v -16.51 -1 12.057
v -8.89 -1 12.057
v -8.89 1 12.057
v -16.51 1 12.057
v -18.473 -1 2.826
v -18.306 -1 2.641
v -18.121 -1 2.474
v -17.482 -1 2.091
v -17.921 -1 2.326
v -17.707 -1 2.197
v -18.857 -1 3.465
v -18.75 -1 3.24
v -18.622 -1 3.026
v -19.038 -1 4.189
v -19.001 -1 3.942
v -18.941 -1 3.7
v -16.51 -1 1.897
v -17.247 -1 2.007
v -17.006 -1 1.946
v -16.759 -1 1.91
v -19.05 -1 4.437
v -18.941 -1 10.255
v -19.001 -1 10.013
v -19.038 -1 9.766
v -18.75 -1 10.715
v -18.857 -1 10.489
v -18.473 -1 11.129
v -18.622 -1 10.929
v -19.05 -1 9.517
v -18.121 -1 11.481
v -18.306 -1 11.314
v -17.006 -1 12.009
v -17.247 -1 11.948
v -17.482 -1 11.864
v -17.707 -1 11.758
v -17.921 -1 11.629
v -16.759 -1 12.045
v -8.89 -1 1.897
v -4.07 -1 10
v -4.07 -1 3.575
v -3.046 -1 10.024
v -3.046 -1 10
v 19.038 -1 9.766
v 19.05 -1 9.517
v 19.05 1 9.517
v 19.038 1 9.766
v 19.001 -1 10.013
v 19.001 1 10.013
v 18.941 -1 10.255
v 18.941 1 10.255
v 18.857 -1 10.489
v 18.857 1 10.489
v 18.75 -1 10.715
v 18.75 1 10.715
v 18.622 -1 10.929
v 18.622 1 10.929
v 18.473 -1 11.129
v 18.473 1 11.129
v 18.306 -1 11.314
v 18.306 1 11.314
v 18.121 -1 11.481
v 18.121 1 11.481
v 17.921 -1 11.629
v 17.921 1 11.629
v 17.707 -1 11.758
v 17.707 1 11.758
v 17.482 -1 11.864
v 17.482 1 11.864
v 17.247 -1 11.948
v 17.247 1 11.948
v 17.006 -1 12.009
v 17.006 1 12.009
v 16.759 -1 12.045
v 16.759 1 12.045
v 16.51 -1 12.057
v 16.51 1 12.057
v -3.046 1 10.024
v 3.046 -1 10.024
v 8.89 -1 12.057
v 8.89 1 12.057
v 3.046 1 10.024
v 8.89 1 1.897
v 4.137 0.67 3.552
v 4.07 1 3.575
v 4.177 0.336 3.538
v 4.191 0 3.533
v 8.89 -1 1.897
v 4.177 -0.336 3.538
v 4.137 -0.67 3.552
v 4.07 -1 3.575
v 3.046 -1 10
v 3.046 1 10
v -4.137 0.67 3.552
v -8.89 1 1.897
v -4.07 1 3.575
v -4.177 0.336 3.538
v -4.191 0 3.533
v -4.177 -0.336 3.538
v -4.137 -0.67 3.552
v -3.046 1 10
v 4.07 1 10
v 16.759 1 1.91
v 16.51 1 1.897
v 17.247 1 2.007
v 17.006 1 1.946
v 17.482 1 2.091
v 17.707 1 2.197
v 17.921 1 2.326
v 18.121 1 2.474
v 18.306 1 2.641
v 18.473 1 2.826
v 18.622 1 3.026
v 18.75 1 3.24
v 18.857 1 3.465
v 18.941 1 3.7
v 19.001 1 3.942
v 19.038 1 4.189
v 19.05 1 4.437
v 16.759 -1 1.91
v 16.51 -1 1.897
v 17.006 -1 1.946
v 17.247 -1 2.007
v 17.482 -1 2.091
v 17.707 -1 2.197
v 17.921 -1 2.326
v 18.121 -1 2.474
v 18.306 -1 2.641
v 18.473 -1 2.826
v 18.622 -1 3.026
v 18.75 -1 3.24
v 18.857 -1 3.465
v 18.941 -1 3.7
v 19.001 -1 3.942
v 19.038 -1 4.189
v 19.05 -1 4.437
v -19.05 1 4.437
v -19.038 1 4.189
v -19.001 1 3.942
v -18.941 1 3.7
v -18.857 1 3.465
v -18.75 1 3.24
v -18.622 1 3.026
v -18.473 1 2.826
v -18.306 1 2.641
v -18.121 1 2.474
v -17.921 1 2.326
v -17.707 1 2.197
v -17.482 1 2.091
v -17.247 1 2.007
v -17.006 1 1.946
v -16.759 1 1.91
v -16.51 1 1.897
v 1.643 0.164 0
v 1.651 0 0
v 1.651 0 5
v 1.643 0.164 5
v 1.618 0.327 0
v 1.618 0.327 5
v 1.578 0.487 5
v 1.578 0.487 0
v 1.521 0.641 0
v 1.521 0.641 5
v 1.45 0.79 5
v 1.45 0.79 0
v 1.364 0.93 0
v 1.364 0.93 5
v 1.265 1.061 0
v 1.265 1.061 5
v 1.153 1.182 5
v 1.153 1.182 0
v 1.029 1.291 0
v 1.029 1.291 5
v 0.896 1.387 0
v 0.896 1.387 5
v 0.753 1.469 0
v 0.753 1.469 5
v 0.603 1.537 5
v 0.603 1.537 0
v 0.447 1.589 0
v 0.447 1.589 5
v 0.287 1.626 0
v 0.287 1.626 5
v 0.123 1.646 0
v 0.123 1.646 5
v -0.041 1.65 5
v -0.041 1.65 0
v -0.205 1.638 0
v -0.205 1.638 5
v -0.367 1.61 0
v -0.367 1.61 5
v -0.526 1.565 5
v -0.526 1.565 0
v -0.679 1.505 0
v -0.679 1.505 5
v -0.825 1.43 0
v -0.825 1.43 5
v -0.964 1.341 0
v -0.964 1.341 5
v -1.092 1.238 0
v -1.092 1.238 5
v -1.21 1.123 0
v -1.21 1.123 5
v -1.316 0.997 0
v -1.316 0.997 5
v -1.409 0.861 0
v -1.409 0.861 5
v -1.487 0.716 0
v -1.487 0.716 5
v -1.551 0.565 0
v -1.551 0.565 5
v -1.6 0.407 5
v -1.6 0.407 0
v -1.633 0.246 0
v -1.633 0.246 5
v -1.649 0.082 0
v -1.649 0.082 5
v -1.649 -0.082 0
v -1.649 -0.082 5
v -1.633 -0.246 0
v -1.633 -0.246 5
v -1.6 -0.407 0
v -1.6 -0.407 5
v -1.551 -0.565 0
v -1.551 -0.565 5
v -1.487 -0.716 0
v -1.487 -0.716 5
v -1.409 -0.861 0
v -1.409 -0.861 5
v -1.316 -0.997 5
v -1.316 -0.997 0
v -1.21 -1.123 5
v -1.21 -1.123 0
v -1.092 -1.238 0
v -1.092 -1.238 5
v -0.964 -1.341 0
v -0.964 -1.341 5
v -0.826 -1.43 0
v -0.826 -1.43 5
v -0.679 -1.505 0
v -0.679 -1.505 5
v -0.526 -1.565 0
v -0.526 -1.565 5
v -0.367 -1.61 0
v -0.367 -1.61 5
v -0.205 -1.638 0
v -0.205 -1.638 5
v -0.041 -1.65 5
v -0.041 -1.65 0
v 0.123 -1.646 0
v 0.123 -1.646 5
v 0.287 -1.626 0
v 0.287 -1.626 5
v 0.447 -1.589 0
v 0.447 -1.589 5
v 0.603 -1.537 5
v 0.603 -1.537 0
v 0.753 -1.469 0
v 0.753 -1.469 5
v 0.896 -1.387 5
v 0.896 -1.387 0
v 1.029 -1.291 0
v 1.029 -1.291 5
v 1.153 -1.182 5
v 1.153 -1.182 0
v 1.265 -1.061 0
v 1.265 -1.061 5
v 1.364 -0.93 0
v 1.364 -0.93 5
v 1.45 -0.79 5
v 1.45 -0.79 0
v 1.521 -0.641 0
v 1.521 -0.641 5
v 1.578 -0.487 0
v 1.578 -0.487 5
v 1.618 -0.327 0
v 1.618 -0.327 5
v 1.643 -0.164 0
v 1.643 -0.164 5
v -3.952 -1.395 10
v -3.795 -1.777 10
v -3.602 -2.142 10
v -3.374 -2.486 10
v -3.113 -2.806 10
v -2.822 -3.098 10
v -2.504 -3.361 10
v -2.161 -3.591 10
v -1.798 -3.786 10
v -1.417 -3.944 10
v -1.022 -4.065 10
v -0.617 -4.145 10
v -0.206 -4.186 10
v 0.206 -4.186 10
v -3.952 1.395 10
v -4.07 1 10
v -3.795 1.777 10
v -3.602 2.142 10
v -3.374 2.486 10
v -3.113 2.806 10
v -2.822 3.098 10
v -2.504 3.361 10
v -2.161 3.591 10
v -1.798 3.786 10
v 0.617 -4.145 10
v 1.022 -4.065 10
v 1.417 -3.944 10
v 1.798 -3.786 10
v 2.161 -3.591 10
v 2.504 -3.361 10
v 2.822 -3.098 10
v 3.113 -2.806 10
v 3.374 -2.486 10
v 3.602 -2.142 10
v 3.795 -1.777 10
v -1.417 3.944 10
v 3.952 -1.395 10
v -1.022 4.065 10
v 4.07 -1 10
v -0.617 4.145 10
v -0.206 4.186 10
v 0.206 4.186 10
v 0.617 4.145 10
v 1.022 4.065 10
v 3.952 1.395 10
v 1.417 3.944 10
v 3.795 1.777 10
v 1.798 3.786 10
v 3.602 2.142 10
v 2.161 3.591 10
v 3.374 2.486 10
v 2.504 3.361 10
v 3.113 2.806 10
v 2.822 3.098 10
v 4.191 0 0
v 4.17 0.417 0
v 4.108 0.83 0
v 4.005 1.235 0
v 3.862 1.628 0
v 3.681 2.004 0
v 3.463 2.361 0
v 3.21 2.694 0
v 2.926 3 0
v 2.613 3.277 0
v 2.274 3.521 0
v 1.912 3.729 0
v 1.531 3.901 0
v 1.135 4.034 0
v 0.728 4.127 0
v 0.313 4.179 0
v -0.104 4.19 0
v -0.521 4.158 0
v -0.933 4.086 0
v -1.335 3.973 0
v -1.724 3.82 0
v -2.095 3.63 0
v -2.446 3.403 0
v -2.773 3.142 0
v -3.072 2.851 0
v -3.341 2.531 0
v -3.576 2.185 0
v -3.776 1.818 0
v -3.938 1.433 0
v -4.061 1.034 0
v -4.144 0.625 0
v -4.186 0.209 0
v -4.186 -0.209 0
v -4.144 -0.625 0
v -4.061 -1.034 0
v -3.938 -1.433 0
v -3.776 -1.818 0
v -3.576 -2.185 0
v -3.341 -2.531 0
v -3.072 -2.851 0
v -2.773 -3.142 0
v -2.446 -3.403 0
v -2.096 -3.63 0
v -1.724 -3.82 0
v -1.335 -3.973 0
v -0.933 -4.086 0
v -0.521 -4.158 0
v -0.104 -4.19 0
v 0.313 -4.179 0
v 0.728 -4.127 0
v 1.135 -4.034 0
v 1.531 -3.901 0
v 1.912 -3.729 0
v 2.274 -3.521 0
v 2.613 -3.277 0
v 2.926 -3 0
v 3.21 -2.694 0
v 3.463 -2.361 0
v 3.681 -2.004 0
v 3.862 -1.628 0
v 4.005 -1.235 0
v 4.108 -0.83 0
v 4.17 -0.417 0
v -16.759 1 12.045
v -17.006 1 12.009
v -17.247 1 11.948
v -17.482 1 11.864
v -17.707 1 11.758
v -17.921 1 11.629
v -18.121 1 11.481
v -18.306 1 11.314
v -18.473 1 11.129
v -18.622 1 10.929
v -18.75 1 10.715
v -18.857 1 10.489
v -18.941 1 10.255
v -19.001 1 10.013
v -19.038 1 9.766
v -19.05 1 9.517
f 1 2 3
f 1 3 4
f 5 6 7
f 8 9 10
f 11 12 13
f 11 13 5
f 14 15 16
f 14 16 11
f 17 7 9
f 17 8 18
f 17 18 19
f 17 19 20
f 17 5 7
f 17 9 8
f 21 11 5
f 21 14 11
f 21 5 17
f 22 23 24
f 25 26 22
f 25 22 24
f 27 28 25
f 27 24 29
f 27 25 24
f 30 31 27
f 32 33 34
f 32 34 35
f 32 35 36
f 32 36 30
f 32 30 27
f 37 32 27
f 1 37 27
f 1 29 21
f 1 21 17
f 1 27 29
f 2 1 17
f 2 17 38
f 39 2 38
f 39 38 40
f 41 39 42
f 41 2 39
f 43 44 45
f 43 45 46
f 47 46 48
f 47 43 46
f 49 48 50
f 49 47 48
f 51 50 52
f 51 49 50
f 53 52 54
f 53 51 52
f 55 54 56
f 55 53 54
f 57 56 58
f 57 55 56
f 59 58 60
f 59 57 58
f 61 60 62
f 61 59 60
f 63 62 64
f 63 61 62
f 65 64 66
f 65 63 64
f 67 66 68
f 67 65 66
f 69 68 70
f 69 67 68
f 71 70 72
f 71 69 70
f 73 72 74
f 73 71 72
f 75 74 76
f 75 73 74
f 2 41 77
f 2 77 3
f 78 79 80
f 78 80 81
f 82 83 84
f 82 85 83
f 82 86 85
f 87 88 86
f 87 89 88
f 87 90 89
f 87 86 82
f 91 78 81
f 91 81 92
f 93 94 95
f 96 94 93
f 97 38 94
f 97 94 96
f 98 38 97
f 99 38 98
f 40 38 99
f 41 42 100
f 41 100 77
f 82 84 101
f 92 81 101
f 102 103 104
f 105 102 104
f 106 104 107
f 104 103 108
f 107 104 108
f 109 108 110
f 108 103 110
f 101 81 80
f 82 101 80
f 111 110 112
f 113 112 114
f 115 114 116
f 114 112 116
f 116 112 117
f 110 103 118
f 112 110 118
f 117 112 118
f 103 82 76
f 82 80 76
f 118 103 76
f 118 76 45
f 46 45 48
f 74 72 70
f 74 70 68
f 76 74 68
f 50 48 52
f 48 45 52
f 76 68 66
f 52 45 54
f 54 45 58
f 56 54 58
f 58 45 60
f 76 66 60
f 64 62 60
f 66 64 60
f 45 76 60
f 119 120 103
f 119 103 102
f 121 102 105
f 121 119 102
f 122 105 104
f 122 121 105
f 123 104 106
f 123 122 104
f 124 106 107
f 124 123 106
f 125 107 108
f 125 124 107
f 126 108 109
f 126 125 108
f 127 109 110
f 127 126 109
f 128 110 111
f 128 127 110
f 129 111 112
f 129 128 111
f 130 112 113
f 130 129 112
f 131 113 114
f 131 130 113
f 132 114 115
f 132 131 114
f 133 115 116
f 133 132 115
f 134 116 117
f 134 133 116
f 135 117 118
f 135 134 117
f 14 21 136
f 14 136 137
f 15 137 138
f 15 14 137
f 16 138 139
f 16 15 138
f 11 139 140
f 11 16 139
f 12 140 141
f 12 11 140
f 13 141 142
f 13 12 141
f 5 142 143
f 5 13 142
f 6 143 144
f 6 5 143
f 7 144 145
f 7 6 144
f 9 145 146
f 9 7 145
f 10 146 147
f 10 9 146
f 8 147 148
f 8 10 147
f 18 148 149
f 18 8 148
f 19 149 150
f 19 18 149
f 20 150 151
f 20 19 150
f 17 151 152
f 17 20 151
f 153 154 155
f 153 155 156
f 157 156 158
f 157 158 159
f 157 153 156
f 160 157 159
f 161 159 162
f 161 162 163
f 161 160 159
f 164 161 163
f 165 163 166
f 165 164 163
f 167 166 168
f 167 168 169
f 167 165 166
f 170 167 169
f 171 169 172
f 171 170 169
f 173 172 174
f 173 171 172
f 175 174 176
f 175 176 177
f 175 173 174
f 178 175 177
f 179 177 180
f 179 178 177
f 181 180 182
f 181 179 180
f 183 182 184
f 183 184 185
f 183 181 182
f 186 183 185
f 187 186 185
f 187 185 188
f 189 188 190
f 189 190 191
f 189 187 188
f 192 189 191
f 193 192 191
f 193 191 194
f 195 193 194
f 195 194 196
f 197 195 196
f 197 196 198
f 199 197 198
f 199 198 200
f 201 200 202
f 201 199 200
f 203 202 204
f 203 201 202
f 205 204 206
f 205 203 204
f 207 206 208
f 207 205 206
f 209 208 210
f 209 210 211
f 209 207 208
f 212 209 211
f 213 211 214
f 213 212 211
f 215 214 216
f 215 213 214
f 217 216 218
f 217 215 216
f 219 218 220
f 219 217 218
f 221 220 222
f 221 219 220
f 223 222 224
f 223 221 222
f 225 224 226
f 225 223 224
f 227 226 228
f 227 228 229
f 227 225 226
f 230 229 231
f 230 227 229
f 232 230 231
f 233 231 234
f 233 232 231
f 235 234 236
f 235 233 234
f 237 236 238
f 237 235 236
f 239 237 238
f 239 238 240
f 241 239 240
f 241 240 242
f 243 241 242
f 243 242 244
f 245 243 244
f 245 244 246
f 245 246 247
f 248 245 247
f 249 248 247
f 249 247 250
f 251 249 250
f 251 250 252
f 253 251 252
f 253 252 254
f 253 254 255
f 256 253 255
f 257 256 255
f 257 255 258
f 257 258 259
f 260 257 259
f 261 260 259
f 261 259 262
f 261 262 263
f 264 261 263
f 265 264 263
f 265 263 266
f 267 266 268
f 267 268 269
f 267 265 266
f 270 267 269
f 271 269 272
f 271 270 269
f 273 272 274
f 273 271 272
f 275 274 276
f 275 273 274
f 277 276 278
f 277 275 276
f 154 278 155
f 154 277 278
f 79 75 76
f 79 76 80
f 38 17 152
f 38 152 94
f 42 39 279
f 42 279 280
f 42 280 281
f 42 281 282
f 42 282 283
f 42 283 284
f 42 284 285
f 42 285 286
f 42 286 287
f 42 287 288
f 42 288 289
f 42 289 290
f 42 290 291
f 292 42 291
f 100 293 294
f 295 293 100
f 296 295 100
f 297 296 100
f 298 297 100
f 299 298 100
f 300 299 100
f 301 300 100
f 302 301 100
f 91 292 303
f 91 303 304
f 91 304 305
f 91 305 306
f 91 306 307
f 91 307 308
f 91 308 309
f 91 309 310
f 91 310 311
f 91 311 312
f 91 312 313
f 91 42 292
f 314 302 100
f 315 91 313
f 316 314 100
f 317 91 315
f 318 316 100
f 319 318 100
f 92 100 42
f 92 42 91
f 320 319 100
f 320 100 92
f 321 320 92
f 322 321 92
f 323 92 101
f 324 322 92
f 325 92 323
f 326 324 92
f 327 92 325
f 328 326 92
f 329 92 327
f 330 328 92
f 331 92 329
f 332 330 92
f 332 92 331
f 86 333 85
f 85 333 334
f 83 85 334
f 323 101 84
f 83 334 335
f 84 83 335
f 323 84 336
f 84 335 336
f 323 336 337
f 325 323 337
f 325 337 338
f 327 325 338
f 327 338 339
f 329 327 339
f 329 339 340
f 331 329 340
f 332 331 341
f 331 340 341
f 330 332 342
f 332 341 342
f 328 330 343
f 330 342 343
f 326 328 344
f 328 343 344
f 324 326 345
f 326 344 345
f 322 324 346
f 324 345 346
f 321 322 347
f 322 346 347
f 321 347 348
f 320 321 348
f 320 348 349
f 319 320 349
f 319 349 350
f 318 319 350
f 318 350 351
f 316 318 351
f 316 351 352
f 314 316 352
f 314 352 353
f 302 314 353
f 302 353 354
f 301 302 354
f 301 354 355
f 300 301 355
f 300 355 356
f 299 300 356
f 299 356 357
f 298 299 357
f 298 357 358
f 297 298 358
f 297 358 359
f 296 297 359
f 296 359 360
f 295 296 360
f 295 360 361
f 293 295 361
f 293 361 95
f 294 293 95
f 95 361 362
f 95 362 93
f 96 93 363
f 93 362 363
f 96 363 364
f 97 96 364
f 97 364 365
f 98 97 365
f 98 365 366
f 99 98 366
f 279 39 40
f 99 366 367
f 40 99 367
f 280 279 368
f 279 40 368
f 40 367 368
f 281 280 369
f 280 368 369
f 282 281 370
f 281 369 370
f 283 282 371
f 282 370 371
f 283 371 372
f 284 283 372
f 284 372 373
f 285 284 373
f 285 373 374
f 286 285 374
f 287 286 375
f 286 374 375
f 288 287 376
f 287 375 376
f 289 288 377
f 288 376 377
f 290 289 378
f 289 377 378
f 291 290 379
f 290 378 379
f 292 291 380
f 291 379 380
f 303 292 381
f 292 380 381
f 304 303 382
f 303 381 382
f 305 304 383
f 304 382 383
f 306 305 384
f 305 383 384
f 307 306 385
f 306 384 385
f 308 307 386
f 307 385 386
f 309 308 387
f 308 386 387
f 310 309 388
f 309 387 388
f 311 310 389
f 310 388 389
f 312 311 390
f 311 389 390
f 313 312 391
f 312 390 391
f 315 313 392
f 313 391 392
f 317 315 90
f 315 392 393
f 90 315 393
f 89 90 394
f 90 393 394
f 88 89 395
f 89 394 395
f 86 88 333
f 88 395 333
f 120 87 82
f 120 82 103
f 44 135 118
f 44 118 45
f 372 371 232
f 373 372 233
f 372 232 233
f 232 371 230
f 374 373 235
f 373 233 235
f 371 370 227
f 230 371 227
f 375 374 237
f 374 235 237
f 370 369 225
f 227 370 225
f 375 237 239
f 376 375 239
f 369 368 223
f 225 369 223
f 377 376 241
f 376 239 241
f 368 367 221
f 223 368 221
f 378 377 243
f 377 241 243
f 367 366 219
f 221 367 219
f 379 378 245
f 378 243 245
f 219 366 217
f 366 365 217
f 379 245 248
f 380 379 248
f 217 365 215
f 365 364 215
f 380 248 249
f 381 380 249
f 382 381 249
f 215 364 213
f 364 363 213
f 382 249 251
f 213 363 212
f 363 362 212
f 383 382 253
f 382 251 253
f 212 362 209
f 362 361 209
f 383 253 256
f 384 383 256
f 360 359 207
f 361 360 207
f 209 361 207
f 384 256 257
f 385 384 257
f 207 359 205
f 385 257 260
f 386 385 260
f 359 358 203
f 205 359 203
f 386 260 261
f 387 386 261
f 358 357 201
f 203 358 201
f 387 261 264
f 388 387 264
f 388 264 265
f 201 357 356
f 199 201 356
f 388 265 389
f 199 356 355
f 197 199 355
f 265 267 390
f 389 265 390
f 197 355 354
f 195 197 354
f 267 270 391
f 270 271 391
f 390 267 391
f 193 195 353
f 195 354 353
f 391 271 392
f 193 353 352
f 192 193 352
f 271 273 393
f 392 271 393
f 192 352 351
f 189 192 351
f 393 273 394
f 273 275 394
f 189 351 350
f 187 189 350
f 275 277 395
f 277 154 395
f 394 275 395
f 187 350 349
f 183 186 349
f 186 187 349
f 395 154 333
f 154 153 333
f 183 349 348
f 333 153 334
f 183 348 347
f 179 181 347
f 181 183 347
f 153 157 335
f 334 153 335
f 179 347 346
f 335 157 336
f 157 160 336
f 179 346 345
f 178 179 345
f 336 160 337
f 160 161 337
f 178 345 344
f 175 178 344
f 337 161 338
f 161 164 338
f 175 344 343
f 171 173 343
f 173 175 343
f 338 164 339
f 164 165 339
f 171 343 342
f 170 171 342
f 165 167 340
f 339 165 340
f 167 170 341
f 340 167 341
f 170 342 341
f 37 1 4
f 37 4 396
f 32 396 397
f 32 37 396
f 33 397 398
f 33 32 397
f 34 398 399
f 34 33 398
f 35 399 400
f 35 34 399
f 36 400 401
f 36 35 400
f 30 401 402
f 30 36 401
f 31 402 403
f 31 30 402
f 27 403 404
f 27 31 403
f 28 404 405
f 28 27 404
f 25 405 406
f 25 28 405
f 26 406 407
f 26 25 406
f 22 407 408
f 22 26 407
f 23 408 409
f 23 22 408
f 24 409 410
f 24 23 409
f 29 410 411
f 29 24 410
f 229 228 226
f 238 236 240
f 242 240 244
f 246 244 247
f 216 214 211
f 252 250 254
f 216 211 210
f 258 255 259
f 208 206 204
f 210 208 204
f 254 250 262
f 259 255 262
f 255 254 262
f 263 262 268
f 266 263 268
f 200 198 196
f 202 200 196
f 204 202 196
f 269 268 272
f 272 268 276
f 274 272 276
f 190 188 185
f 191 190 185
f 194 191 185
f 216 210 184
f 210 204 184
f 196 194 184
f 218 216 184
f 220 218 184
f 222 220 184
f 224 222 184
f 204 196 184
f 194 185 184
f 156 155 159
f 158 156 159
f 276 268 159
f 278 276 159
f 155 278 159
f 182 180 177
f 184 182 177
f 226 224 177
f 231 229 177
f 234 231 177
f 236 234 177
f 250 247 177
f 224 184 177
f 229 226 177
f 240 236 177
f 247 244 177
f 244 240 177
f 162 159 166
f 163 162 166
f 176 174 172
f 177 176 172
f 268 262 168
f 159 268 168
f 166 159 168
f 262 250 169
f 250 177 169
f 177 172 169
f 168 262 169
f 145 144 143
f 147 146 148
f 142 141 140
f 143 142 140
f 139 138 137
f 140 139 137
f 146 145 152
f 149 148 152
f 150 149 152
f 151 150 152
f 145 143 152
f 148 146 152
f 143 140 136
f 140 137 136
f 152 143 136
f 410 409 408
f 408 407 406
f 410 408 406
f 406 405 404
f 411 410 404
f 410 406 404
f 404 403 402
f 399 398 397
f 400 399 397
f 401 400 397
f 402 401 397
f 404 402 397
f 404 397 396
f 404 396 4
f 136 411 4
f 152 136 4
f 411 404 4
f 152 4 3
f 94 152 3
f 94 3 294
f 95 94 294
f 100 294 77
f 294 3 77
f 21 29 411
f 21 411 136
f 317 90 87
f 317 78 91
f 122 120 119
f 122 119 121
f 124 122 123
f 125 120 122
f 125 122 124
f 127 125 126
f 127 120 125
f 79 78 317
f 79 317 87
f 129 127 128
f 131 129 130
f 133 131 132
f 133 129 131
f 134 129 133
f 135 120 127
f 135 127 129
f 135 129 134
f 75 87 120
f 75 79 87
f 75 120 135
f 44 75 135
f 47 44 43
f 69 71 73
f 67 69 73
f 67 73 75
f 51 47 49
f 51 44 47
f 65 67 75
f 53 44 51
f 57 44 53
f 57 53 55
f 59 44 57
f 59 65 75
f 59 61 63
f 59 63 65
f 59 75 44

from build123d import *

# Parameters (mm, degrees)
F0_R     = 4.191
F1_DEPTH = 10
F2_R     = 1.651
F3_DEPTH = 5
F6_DEPTH = 2


with BuildPart() as f1:
    # F0 (on Top) → F1 (new body)
    with BuildSketch(Plane.XY):
        Circle(F0_R)
    extrude(amount=F1_DEPTH)

    # F2 (on Top) → F3 (cut)
    with BuildSketch(Plane.XY):
        Circle(F2_R)
    extrude(amount=F3_DEPTH, mode=Mode.SUBTRACT)

    # F5 (on offset) → F6 (join)
    with BuildSketch(Plane.XZ.offset(1)):
        with BuildLine():
            Line((-16.51, 1.89748), (-8.89, 1.89748))
            Line((-8.89, 1.89748), (-8.89, 5.08))
            Line((-8.89, 5.08), (-8.89, 12.05748))
            Line((-8.89, 12.05748), (-16.51, 12.05748))
            ThreePointArc((-16.51, 12.05748), (-18.306051, 11.313531), (-19.05, 9.51748))
            Line((-19.05, 9.51748), (-19.05, 4.43748))
            ThreePointArc((-19.05, 4.43748), (-18.306051, 2.641429), (-16.51, 1.89748))
        make_face()
        Polygon((-8.89, 1.89748), (-3.046233, 3.931247), (-3.046233, 10.023713), (-8.89, 12.05748), (-8.89, 5.08), align=None)
        Polygon((3.046233, 3.931247), (8.89, 1.89748), (8.89, 5.08), (8.89, 12.05748), (3.046233, 10.023713), align=None)
        with BuildLine():
            Line((8.89, 5.08), (8.89, 1.89748))
            Line((8.89, 1.89748), (16.51, 1.89748))
            ThreePointArc((16.51, 1.89748), (18.306051, 2.641429), (19.05, 4.43748))
            Line((19.05, 4.43748), (19.05, 9.51748))
            ThreePointArc((19.05, 9.51748), (18.306051, 11.313531), (16.51, 12.05748))
            Line((16.51, 12.05748), (8.89, 12.05748))
            Line((8.89, 12.05748), (8.89, 5.08))
        make_face()
    extrude(amount=-F6_DEPTH)


solid = f1.part
